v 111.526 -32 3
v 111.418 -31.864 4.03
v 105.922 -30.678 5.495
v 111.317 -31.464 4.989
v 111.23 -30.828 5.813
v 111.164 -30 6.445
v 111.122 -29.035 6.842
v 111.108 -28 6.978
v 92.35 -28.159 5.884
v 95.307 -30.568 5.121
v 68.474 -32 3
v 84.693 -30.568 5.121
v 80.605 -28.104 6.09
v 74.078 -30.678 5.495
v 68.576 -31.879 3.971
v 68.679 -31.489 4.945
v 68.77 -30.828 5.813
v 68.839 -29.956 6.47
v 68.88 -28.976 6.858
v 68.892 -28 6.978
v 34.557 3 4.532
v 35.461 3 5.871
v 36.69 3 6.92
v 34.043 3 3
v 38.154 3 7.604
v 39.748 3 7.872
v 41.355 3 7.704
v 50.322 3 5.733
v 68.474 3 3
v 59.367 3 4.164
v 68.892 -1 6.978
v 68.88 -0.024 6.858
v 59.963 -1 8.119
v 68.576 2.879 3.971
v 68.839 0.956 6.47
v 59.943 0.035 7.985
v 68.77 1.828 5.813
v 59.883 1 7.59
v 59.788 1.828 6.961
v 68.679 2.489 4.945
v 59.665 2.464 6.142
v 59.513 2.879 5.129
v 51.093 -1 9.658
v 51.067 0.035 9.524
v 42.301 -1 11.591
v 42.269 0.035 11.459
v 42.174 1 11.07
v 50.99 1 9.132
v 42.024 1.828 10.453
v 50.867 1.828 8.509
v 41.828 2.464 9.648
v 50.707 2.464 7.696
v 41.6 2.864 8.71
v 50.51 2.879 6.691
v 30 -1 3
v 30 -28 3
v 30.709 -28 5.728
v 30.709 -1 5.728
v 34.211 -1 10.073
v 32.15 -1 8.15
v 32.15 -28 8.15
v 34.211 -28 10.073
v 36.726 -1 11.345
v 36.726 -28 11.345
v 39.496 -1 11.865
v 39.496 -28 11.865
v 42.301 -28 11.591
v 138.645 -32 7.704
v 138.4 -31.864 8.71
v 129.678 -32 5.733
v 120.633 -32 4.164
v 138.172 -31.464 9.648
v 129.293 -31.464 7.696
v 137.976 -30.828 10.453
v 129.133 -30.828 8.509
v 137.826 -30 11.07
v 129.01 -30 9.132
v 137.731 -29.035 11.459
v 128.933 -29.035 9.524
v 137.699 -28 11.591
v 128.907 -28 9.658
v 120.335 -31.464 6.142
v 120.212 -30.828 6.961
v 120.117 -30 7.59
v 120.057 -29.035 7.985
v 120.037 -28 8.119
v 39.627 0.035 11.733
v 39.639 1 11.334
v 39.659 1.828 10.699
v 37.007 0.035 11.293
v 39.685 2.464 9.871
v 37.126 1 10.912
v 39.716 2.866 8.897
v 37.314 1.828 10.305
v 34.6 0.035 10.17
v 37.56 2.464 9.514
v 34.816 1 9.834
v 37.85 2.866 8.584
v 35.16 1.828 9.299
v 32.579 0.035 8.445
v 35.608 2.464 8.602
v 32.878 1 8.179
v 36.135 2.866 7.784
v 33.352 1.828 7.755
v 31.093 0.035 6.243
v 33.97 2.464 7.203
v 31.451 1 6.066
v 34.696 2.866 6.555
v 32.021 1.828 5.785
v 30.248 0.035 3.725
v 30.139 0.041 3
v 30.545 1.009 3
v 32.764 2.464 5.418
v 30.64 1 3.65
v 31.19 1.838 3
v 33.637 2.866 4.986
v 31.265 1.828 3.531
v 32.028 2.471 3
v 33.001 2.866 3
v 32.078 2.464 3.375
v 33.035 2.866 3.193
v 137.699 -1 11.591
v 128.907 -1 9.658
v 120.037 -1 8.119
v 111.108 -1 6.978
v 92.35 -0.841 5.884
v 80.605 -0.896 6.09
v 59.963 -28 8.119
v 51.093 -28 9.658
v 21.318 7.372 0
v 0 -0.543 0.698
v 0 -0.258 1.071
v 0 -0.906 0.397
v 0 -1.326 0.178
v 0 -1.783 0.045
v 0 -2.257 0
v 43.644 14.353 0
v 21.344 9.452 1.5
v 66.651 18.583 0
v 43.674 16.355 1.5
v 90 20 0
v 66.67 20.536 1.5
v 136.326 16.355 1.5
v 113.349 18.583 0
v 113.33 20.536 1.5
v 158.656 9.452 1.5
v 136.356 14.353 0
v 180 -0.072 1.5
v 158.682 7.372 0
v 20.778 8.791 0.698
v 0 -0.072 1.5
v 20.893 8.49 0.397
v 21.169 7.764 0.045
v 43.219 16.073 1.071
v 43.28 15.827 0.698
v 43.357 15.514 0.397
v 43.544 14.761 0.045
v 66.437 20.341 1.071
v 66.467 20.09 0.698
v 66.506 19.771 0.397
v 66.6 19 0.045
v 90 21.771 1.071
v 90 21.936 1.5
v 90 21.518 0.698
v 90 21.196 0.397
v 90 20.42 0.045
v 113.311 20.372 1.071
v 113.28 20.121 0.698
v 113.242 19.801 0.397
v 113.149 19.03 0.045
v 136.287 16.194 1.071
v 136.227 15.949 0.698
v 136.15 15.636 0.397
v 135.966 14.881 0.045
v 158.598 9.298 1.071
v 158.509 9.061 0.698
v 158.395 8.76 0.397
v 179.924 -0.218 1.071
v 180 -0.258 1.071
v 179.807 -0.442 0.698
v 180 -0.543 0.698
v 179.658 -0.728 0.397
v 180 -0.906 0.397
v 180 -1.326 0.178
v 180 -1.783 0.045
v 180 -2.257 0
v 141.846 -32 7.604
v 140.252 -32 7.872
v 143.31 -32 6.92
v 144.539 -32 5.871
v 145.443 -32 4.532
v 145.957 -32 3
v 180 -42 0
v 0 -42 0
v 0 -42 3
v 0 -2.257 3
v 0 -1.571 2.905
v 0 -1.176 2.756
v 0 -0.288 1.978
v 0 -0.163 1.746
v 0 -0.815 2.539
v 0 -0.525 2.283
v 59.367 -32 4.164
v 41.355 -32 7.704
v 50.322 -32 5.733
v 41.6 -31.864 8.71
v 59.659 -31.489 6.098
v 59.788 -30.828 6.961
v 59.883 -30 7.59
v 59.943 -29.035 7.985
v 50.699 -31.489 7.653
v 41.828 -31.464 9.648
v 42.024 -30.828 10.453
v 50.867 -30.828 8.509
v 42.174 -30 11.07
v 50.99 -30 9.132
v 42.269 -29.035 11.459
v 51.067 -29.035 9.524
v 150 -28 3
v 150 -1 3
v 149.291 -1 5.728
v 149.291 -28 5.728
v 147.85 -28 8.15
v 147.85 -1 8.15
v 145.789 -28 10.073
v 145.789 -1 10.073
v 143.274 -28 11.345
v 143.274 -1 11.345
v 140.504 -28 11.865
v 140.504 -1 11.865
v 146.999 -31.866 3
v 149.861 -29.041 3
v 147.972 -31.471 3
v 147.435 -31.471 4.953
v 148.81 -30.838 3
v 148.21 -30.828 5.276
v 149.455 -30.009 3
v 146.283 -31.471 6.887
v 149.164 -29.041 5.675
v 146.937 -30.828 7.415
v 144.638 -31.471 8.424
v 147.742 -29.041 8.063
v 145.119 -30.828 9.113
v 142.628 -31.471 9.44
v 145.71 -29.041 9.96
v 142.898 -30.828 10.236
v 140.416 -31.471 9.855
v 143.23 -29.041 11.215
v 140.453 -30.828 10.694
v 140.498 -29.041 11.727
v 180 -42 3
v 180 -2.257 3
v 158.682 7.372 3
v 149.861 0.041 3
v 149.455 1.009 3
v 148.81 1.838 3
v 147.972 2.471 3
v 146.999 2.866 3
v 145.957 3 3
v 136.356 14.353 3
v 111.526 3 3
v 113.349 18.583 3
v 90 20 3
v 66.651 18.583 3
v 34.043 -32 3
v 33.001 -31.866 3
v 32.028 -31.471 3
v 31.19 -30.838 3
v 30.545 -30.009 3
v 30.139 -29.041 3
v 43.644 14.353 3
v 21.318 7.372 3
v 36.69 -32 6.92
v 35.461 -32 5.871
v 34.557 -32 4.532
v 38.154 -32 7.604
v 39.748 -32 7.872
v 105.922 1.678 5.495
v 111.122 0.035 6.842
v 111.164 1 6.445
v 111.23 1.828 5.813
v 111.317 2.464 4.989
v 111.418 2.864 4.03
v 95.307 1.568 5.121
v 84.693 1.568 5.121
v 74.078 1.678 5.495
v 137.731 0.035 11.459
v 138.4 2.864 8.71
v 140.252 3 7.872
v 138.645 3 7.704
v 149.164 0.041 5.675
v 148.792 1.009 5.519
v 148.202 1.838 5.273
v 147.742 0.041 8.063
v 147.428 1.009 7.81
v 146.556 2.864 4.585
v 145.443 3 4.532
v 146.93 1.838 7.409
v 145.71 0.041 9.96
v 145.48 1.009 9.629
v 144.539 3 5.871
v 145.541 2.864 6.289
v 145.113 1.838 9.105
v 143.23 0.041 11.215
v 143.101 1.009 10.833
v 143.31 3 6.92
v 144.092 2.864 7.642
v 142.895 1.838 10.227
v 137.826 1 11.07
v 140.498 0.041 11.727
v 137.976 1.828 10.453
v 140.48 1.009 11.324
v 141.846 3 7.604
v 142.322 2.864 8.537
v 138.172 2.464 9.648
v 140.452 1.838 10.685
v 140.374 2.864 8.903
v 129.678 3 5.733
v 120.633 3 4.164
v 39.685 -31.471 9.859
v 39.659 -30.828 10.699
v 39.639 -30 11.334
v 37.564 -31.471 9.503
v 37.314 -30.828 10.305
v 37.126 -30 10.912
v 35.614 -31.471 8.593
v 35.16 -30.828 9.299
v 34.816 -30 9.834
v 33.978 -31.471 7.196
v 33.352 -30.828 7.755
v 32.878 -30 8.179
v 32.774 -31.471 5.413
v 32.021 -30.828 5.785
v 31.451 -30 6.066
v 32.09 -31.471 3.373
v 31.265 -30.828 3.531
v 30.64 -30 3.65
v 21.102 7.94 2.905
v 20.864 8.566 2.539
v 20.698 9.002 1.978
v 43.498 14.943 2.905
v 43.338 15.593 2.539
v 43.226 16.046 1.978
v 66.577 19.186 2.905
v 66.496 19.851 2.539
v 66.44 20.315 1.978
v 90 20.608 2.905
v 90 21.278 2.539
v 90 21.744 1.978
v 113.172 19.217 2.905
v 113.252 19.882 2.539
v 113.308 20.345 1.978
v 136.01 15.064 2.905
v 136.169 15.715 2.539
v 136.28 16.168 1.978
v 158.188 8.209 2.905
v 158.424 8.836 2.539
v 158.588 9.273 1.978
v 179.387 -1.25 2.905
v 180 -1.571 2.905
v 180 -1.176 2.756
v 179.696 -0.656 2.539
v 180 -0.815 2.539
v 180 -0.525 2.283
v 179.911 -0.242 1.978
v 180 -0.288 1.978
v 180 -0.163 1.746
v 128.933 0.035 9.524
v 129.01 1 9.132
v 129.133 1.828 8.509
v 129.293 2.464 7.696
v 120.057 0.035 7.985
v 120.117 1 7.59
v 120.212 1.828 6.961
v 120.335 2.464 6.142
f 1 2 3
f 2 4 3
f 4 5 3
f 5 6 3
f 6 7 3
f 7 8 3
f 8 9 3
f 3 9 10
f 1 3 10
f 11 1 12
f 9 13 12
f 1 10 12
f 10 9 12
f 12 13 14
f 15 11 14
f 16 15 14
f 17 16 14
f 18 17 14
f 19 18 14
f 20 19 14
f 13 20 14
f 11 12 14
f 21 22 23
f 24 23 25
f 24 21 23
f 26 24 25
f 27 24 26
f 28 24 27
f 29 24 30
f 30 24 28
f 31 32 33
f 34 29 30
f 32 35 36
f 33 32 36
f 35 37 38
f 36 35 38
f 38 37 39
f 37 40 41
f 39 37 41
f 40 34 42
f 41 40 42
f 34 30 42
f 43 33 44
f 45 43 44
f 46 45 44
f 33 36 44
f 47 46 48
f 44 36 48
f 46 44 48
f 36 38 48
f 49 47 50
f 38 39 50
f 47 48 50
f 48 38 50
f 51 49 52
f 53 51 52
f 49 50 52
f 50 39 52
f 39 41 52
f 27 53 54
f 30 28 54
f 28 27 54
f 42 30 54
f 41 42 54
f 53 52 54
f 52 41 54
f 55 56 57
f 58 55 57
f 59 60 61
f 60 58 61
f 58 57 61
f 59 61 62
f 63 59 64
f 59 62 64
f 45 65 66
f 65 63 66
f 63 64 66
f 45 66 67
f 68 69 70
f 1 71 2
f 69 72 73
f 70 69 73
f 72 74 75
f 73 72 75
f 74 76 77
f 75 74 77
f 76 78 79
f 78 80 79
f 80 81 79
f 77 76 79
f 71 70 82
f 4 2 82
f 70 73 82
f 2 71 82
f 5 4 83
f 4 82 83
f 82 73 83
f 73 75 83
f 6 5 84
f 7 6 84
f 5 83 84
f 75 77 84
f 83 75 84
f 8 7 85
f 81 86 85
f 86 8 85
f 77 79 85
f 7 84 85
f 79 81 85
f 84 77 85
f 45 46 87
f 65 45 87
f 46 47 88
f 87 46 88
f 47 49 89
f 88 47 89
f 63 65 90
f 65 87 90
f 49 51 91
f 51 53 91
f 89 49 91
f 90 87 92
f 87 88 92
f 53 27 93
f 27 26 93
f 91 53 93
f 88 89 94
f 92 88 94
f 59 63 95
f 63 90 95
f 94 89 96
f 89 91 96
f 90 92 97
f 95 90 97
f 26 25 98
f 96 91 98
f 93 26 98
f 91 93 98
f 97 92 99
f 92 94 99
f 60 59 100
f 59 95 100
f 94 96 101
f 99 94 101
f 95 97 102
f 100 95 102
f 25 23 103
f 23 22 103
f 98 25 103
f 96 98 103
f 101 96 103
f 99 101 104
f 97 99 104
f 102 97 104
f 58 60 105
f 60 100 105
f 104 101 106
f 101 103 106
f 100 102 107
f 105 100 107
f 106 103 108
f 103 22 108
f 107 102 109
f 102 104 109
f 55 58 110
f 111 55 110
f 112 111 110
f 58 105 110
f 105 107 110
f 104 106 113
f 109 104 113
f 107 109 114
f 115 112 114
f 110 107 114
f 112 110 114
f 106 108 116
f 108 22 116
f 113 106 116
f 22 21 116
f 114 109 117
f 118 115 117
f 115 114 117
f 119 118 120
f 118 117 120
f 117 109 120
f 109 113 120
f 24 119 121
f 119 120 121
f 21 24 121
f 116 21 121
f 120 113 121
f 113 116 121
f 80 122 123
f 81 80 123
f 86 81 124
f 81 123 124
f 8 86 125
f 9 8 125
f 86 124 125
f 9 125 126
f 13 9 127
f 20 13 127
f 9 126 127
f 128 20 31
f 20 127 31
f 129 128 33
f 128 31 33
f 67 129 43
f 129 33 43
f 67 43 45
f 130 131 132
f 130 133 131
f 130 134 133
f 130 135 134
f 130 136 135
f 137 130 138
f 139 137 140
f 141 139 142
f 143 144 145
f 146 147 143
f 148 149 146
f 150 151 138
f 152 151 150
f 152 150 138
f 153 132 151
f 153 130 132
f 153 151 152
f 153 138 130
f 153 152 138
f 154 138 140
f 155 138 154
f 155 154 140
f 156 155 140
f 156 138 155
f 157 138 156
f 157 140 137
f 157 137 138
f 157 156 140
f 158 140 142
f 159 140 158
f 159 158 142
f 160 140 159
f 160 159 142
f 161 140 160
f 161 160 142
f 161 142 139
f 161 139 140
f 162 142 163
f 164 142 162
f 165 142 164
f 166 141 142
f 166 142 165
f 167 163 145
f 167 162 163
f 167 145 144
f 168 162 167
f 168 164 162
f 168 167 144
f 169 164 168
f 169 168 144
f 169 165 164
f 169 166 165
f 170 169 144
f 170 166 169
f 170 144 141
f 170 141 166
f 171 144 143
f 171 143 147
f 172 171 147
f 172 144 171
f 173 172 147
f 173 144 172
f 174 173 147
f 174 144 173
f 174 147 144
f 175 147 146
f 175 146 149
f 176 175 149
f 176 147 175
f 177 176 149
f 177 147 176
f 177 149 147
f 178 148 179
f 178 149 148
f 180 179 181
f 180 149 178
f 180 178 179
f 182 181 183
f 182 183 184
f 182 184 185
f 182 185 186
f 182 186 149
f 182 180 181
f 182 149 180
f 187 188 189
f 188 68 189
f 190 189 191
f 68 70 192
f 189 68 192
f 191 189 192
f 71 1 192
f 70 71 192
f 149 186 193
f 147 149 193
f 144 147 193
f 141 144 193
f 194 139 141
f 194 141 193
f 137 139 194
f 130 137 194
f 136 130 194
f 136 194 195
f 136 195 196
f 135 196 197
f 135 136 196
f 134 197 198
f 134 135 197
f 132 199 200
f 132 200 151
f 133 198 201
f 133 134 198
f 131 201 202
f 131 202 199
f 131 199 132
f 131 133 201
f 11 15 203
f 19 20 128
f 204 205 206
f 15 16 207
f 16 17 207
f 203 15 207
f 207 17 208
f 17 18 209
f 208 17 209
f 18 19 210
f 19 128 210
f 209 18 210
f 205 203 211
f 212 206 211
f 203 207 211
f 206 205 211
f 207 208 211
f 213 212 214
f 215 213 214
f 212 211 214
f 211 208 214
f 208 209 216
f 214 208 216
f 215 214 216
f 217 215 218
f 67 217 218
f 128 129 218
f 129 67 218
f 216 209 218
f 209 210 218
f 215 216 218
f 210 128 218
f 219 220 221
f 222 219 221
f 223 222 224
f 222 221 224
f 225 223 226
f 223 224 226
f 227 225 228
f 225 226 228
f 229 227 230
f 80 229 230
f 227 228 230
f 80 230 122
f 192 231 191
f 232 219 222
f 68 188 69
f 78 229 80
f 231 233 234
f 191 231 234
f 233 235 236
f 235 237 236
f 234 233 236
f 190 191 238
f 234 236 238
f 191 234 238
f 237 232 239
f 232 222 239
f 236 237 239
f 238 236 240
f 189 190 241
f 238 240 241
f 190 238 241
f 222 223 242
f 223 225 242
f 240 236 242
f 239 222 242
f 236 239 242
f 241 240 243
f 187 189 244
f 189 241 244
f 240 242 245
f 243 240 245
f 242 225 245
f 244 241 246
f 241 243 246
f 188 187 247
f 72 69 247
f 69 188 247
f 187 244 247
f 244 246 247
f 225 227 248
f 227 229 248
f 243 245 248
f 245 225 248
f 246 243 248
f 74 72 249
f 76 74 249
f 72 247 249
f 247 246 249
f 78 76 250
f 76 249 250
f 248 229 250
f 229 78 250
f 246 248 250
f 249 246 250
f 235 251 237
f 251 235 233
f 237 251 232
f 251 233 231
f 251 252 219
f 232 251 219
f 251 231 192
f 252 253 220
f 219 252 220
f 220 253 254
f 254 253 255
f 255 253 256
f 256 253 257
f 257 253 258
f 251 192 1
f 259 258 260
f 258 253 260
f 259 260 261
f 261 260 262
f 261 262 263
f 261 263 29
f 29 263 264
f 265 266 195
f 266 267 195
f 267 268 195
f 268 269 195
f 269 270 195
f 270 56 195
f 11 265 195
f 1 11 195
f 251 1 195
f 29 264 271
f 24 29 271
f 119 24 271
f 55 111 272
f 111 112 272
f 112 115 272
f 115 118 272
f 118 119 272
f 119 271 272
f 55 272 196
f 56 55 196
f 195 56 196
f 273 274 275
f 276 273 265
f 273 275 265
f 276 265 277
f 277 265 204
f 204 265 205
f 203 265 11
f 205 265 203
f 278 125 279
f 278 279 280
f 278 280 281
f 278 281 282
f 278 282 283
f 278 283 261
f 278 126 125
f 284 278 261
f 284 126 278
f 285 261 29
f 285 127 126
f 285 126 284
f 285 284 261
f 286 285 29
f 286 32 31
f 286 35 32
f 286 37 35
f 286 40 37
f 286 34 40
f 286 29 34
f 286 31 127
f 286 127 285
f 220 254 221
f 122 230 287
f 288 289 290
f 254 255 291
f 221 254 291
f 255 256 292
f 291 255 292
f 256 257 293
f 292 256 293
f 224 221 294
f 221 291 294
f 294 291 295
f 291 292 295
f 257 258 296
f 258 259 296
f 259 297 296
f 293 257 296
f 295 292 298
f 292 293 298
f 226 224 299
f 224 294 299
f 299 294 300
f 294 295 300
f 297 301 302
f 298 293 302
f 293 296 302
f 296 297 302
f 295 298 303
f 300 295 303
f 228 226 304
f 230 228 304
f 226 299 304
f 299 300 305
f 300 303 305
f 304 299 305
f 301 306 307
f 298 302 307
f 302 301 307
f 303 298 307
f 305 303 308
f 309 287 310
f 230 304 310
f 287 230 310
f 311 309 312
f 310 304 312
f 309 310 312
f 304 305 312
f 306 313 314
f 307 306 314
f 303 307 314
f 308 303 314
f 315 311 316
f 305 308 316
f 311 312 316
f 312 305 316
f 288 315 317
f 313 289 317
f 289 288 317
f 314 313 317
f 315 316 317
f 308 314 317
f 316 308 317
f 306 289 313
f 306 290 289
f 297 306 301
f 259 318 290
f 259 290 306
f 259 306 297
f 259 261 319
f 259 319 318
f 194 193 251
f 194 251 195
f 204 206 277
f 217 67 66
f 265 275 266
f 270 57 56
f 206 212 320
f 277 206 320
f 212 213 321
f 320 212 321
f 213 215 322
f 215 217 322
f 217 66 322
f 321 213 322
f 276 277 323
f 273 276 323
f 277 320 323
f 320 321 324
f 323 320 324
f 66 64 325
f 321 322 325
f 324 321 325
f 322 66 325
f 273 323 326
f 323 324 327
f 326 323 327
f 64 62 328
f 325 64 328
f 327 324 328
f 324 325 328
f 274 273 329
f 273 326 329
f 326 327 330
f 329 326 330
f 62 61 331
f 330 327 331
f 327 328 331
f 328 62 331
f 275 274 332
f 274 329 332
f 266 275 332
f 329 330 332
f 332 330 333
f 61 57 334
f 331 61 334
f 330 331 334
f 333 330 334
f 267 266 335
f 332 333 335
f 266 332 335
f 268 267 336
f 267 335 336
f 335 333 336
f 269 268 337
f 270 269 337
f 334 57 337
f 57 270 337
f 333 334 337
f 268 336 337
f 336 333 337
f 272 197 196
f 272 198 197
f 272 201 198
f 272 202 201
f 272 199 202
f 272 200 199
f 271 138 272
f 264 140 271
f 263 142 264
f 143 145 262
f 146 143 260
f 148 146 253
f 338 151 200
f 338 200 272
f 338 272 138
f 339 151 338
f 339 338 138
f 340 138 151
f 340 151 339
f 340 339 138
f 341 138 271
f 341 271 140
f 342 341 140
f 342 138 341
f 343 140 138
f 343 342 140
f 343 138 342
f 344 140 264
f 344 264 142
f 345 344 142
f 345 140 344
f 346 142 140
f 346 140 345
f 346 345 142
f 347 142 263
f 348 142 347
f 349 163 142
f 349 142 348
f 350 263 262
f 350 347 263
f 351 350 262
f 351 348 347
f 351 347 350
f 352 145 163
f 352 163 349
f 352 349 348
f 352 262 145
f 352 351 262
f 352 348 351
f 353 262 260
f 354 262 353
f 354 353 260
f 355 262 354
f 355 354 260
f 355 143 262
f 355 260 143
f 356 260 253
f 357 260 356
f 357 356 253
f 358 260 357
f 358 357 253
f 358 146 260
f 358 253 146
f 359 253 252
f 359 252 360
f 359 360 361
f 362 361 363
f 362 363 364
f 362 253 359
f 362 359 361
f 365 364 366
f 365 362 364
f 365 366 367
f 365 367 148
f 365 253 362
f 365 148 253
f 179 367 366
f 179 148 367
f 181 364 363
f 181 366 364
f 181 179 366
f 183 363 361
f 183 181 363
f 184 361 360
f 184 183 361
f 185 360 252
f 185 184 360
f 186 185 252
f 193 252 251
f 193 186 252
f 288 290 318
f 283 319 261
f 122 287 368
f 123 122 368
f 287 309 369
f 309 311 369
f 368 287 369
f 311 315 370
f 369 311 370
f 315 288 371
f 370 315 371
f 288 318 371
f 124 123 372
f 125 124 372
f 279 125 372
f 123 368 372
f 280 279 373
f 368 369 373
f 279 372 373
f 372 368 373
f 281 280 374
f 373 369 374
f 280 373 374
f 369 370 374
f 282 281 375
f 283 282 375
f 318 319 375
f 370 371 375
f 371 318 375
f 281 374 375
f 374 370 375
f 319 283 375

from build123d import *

# Parameters (mm, degrees)
BOSS_EXTRUDE1_DEPTH = 3
SKETCH2_W           = 120
SKETCH2_H           = 35
BOSS_EXTRUDE2_DEPTH = 12
CUT_EXTRUDE1_REACH  = 188.145
FILLET1_R           = 10
FILLET2_R           = 4
FILLET3_R           = 2


with BuildPart() as part:
    # Sketch1 → Boss-Extrude1 (new body)
    with BuildSketch(Plane.XY):
        with BuildLine():
            Line((180, 0), (180, -42))
            Line((180, -42), (0, -42))
            Line((0, -42), (0, 0))
            ThreePointArc((0, 0), (90, 22), (180, 0))
        make_face()
    extrude(amount=BOSS_EXTRUDE1_DEPTH)

    # Sketch2 → Boss-Extrude2 (add)
    with BuildSketch(Plane.XY.offset(3)):
        with Locations((90, -14.5)):
            Rectangle(SKETCH2_W, SKETCH2_H)
    extrude(amount=BOSS_EXTRUDE2_DEPTH)

    # Sketch3 → Cut-Extrude1 (cut, up to next)
    with BuildSketch(Plane(origin=(0, 3, 0), x_dir=(1, 0, 0), z_dir=(0, 1, 0)), mode=Mode.PRIVATE) as cut_extrude1_sk1:
        with BuildLine():
            Line((30, -15), (150, -15))
            ThreePointArc((150, -15), (90, -5.870751133), (30, -15))
        make_face()
    cut_extrude1_tool1 = extrude(cut_extrude1_sk1.sketch, amount=-CUT_EXTRUDE1_REACH, mode=Mode.PRIVATE) & part.part
    add(cut_extrude1_tool1.solids().sort_by_distance((90, 3, 11.341124))[0], mode=Mode.SUBTRACT)

    # Fillet1
    # the kernel refuses this fillet: 10 mm, written as the material it takes off along each edge
    with BuildSketch(Plane(origin=(150, 34.911423728, 15), x_dir=(0, 0, -1), z_dir=(0, -1, 0)), Plane(origin=(30, -63.911423728, 15), x_dir=(0, 0, -1), z_dir=(0, 1, 0))) as fillet1_piece_1:
        with BuildLine():
            CenterArc((13.125456564, -9.936465545), FILLET1_R, 96.462082414, 97.214818073)
            Line((3.409011311, -12.300929891), (3.214682406, -12.348219178))
            ThreePointArc((3.214682406, -12.348219178), (1.609086457, -6.176908891), (-0.190949181, -0.059484539))
            Line((-0.190949181, -0.059484539), (0, 0.2))
            ThreePointArc((0, 0.2), (6, 0.2), (11.977490869, 0.198729311))
            Line((11.977490869, 0.198729311), (12, 0))
        make_face()
    extrude(amount=98.822847456, mode=Mode.SUBTRACT)

    # Fillet2
    fillet2_edges = [part.edges().sort_by_distance(p)[0] for p in [
        (90, -32, 5.870751133),
        (90, 3, 5.870751133),
        (34.210640521, 3, 10.073014501),
        (145.789359479, 3, 10.073014501),
        (34.210640521, -32, 10.073014501),
        (145.789359479, -32, 10.073014501),
    ]]
    fillet(fillet2_edges, radius=FILLET2_R)

    # Fillet3
    # the kernel refuses this fillet: 2 mm, written as the material it takes off along each edge
    with BuildSketch(Plane(origin=(90, -173.090909091, 0), x_dir=(-0.4839116978541771, 0.8751168314458863, 0), z_dir=(-0.8751168314458863, -0.4839116978541771, 0))) as fillet3_piece_1:
        with BuildLine():
            CenterArc((195.090909091 - FILLET3_R, -FILLET3_R), FILLET3_R, 0, 90)
            Line((195.090909091 - FILLET3_R, 0), (195.090909091, 0))
            Line((195.090909091, 0), (195.090909091, -FILLET3_R))
        make_face()
    revolve(axis=Axis((90, -173.090909091, 0), (0, 0, -1)), revolution_arc=57.882388788, mode=Mode.SUBTRACT)
    with BuildSketch(Plane(origin=(90, -173.090909091, 3), x_dir=(-0.4839116978541771, 0.8751168314458863, 0), z_dir=(-0.8751168314458863, -0.4839116978541771, 0))) as fillet3_piece_2:
        with BuildLine():
            CenterArc((195.090909091 - FILLET3_R, FILLET3_R), FILLET3_R, 270, 90)
            Line((195.090909091, FILLET3_R), (195.090909091, 0))
            Line((195.090909091, 0), (195.090909091 - FILLET3_R, 0))
        make_face()
    revolve(axis=Axis((90, -173.090909091, 3), (0, 0, -1)), revolution_arc=57.882388788, mode=Mode.SUBTRACT)


solid = part.part
